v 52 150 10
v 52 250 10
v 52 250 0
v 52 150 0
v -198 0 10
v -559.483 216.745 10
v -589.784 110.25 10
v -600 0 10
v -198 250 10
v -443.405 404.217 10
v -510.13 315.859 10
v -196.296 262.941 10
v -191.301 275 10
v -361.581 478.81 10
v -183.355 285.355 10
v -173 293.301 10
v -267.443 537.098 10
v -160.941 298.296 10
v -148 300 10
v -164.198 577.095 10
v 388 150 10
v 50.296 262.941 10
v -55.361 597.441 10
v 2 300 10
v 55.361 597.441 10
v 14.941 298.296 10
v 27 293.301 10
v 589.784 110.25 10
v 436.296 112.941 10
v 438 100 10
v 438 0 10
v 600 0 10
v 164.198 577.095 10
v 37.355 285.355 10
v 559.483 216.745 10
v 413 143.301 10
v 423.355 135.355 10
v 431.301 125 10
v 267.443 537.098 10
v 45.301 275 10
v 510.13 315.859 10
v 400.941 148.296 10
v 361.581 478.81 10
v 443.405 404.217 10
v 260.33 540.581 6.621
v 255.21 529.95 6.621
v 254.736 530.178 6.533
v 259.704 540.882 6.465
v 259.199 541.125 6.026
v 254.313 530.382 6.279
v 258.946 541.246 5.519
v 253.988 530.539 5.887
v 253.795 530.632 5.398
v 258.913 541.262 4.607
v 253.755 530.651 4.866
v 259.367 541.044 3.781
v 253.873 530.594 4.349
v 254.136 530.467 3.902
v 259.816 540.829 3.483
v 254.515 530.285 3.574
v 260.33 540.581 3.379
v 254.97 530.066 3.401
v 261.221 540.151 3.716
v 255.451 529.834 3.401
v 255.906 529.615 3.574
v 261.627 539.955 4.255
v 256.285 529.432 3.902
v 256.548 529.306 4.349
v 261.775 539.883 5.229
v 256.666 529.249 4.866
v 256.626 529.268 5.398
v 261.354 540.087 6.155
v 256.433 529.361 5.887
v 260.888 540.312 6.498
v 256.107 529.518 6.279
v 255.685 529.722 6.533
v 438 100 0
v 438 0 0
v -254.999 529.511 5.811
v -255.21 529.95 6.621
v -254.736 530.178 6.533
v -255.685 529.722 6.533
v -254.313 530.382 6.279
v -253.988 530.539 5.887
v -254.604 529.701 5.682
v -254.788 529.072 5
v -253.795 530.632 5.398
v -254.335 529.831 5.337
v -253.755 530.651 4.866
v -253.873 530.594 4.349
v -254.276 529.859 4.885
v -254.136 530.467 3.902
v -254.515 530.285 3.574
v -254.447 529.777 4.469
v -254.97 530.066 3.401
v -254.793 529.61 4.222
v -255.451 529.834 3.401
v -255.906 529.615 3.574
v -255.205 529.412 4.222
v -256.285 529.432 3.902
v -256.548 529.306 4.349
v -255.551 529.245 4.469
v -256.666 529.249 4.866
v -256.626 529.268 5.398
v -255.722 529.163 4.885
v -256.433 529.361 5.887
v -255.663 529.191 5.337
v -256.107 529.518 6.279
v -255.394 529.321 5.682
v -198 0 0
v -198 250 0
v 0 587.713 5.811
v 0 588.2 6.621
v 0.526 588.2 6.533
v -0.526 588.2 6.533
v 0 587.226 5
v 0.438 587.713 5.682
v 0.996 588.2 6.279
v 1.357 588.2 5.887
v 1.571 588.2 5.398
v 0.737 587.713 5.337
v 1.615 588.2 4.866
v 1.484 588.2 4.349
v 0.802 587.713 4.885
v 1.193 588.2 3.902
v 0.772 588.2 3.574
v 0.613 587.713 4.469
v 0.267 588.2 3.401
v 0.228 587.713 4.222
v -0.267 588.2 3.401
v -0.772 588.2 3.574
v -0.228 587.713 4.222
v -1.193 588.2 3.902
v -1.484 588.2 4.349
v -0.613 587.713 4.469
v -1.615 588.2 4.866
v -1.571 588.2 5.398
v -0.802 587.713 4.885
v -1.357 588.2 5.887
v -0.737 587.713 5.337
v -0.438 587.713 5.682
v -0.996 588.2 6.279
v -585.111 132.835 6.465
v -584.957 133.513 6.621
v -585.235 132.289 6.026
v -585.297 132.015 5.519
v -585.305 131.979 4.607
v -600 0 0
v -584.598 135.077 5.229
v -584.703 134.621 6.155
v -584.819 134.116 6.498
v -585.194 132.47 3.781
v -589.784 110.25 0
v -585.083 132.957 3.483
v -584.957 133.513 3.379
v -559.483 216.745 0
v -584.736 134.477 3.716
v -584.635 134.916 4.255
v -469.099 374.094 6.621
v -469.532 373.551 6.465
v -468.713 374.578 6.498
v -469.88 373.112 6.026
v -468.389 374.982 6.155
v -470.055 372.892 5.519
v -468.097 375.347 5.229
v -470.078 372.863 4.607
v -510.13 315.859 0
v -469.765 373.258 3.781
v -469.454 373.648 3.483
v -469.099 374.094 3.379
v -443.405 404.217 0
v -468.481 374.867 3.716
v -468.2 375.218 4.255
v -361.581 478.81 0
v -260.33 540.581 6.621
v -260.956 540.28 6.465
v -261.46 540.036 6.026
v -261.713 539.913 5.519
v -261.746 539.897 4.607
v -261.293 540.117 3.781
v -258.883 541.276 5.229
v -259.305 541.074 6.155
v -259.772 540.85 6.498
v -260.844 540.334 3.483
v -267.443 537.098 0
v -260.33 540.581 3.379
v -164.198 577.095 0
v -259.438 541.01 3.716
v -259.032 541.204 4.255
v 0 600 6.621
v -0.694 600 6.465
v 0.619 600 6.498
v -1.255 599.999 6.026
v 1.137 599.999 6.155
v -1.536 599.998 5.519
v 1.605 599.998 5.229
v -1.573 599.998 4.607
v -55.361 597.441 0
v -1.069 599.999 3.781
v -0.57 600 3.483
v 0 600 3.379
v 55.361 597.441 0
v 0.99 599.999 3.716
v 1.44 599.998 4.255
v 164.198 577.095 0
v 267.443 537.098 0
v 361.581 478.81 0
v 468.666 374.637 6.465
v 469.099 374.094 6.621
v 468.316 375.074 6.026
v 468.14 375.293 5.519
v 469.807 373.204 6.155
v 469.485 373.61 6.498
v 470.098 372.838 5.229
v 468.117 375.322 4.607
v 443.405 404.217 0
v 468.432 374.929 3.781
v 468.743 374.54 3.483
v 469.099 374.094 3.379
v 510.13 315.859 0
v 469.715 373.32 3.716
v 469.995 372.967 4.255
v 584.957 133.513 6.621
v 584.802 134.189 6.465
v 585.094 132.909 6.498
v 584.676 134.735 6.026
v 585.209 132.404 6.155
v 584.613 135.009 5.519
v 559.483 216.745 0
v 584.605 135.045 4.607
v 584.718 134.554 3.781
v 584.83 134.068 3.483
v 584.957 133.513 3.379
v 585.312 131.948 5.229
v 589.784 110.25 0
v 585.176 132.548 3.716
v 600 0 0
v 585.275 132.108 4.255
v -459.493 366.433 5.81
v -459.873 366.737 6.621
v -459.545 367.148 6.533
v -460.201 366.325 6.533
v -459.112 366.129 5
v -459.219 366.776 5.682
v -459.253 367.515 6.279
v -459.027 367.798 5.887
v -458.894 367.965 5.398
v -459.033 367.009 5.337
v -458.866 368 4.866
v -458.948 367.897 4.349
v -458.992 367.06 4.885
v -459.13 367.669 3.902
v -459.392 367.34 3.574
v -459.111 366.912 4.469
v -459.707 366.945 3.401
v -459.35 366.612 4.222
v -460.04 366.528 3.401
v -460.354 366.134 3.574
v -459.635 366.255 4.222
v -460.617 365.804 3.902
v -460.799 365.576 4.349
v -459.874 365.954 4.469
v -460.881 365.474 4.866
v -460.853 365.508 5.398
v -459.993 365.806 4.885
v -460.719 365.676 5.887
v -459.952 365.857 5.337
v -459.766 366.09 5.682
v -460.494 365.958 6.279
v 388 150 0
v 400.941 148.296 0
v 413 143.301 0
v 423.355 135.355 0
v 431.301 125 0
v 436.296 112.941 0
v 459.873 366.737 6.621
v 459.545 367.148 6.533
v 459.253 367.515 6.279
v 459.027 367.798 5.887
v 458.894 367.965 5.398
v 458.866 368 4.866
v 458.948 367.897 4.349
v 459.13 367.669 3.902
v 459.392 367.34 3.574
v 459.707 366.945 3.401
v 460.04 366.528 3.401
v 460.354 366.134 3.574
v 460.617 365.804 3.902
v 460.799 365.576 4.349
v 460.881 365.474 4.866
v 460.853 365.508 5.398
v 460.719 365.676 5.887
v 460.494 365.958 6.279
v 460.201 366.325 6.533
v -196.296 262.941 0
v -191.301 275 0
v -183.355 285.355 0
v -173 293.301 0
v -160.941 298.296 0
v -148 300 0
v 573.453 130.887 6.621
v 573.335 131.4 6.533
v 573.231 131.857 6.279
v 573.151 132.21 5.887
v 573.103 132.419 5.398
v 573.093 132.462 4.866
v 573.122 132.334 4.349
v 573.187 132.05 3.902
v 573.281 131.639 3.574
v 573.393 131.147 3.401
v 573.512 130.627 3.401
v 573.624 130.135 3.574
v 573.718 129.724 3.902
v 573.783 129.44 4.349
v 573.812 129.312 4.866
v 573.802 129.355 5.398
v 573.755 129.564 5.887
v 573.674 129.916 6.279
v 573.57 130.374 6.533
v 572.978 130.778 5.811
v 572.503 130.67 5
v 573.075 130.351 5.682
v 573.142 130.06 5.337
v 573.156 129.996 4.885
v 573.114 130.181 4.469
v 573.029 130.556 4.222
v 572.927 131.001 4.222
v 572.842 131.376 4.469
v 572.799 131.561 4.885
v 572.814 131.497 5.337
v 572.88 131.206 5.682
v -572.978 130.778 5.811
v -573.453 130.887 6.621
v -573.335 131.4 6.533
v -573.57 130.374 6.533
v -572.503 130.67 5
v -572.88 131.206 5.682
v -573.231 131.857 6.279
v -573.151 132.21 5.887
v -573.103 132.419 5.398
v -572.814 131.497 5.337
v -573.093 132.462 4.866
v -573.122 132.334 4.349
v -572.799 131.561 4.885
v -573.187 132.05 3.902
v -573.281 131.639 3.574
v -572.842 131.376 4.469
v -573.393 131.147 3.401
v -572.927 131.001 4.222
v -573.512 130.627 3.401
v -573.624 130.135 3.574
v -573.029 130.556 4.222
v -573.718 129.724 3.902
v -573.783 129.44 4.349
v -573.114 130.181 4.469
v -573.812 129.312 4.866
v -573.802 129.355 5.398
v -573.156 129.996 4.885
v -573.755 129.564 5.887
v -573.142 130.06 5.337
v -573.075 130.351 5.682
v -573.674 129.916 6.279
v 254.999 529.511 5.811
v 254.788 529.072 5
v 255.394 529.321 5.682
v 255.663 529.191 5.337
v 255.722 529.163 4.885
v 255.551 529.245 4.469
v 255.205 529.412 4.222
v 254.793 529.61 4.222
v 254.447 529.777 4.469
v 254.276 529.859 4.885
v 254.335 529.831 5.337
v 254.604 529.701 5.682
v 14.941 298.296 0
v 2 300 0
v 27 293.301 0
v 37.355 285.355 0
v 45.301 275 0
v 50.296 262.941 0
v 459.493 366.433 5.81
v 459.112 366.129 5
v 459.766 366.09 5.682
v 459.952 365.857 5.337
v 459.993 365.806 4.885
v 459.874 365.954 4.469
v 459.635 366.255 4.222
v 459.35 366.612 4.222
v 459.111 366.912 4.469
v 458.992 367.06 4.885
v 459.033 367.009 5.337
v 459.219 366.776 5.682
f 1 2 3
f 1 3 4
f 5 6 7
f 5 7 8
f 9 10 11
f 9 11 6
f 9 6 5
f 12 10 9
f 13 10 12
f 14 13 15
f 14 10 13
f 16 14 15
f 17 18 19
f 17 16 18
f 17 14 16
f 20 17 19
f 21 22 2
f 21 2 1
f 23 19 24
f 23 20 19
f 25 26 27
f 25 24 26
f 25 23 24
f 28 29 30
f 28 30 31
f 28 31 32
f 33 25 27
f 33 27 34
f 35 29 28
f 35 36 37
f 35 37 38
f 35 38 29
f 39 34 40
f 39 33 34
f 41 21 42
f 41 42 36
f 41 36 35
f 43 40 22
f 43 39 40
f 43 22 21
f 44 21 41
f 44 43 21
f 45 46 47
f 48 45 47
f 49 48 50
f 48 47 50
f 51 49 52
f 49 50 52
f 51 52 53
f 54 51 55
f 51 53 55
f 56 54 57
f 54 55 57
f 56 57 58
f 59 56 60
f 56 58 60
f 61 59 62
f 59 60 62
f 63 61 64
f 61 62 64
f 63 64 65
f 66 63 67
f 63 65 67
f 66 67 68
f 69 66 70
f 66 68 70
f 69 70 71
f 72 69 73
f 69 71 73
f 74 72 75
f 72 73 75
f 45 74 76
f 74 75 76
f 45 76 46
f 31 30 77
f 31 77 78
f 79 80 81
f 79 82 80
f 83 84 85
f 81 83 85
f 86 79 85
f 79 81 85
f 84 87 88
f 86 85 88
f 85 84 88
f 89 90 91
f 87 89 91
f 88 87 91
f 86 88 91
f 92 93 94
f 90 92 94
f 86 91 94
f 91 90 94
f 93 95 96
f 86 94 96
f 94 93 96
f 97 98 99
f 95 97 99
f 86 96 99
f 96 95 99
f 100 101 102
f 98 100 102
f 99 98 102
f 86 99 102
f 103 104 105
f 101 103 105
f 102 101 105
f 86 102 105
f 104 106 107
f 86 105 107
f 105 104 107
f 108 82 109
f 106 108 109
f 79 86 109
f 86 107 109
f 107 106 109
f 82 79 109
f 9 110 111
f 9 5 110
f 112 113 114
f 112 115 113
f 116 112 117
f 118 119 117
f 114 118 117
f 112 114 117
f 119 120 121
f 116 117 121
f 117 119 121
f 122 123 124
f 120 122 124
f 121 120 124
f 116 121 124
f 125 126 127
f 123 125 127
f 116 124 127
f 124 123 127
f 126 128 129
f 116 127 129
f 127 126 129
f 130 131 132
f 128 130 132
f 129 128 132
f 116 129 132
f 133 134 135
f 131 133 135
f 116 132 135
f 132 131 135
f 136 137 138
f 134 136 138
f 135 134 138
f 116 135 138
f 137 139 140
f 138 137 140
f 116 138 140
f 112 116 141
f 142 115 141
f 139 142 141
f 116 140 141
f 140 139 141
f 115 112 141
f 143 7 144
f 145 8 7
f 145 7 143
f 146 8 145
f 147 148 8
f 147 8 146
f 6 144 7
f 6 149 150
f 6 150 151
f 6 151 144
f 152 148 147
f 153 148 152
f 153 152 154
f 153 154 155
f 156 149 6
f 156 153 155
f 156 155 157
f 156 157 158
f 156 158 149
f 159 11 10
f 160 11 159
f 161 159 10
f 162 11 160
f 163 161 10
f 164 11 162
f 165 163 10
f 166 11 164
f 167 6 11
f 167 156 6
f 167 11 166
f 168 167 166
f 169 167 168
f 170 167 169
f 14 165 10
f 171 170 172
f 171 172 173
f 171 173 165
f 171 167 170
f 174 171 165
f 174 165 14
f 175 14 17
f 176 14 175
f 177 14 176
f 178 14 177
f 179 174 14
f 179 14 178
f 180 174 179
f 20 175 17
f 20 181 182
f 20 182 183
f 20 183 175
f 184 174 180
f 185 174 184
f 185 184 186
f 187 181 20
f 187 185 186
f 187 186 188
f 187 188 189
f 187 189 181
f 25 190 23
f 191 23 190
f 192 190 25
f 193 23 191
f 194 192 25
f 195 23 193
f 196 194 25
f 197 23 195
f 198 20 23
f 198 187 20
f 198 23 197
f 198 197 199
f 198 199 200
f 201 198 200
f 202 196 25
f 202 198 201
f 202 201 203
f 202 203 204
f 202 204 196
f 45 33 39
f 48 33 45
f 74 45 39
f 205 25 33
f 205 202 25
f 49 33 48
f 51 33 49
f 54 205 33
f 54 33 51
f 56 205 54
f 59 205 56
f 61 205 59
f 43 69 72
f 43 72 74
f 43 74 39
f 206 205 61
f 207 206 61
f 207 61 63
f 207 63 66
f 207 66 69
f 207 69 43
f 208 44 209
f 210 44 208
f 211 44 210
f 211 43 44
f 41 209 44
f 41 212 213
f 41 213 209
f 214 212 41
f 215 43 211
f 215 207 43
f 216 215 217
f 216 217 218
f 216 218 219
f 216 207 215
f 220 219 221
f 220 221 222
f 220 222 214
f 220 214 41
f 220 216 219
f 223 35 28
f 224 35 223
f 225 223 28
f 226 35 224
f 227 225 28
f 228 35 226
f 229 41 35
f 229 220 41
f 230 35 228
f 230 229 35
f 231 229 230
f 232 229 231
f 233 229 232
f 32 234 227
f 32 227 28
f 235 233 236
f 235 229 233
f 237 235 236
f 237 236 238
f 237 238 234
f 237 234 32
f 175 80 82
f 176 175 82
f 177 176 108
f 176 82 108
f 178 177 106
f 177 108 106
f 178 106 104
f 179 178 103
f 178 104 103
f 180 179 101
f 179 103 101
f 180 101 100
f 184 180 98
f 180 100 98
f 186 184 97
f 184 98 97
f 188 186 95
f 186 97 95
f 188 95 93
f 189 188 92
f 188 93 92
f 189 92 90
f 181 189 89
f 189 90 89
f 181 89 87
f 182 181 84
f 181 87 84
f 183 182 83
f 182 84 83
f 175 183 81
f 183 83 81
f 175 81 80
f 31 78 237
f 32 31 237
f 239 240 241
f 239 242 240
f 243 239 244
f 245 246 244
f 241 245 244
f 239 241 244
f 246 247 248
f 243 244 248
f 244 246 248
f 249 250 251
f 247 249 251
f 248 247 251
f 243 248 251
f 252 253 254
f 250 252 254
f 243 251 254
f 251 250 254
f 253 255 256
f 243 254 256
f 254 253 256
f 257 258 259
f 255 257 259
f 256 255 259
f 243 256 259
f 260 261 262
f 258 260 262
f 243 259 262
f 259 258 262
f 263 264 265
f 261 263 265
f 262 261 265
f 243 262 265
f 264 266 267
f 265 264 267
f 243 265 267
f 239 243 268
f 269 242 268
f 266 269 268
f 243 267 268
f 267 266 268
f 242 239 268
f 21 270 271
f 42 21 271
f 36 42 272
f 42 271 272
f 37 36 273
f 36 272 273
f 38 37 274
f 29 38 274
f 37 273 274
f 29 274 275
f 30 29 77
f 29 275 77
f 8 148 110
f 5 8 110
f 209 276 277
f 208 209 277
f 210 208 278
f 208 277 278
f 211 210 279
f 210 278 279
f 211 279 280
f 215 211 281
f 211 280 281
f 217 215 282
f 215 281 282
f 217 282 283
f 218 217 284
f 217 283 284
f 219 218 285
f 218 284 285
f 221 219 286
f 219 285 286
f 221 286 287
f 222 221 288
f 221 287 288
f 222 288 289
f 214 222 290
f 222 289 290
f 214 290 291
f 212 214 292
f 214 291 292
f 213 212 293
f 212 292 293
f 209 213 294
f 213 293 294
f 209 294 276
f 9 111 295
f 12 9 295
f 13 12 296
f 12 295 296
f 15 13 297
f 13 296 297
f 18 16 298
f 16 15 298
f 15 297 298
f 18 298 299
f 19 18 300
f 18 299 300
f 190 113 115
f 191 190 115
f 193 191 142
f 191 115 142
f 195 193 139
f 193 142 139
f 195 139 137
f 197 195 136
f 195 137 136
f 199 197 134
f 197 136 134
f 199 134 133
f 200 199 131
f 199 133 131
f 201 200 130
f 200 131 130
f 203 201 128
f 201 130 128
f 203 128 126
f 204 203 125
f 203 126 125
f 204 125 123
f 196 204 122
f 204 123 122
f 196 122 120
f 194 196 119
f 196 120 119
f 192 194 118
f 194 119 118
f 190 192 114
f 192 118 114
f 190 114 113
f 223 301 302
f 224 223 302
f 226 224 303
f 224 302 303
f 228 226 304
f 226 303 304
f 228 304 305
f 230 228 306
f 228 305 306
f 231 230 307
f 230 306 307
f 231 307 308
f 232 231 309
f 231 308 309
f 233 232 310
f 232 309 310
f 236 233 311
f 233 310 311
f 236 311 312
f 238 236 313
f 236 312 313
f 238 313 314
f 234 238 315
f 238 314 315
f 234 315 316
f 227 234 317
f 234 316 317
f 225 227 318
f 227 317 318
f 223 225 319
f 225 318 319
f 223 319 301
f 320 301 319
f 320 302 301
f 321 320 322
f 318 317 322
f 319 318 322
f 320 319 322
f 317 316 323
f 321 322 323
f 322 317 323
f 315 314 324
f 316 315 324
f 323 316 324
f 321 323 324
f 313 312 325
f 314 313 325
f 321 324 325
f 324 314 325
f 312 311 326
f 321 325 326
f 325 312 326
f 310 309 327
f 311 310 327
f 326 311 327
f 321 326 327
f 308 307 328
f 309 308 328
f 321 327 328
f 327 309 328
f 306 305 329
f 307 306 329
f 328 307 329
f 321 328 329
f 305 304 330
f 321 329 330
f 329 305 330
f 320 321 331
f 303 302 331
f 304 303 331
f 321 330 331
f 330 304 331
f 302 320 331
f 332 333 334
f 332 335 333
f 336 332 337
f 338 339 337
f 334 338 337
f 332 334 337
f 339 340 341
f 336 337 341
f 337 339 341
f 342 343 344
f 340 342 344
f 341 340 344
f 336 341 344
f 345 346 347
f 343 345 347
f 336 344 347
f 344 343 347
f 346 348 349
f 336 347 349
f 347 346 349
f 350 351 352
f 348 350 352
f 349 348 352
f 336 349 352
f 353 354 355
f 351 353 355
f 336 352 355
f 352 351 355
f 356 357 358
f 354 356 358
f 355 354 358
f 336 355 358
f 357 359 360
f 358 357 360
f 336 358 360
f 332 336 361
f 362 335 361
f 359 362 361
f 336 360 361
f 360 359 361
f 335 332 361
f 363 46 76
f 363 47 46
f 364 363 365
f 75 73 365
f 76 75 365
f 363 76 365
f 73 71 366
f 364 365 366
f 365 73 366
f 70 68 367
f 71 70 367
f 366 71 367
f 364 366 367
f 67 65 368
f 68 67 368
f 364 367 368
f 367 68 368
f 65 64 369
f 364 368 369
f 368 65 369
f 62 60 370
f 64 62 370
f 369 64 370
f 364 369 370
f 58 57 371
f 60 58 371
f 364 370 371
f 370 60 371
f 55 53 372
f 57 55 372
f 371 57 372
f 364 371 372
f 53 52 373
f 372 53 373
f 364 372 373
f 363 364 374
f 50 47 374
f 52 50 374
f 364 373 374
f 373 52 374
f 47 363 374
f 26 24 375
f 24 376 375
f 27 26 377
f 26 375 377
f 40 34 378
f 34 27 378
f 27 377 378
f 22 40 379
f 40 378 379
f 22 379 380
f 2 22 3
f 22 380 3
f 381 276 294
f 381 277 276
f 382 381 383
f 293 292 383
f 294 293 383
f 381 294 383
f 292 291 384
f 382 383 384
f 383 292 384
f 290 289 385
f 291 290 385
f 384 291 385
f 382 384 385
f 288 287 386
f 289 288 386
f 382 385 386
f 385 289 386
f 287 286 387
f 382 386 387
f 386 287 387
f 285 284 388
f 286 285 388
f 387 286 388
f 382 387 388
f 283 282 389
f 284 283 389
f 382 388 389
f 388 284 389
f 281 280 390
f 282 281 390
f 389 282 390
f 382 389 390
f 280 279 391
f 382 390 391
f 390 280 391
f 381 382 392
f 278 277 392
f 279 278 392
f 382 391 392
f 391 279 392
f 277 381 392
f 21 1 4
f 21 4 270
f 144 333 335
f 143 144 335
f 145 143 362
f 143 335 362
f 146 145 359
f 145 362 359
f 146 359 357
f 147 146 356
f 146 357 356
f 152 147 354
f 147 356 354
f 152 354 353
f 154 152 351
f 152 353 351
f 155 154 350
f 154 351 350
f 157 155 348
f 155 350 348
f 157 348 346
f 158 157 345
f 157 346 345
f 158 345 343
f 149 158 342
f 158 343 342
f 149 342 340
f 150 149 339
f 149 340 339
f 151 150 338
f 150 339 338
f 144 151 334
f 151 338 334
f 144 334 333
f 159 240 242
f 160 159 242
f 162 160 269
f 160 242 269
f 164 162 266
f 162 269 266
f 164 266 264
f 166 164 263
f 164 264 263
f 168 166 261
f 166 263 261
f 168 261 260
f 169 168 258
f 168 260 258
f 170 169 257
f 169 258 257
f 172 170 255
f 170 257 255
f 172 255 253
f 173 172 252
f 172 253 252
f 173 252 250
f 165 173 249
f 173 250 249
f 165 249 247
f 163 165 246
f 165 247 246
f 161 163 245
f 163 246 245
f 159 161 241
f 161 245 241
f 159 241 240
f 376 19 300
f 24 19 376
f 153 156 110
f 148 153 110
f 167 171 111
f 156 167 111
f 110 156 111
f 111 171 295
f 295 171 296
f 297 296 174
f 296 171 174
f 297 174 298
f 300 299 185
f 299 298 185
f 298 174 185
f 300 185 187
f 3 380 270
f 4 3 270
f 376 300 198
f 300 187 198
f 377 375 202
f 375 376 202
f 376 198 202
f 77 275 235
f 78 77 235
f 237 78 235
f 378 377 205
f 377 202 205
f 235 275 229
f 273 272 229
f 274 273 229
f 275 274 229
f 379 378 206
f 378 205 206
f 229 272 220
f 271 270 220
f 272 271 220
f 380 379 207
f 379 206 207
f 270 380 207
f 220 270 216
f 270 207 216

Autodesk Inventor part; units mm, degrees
ref_plane "YZ Plane" through (0, 0, 0) normal (1, 0, 0) x (0, 1, 0)
ref_plane "XZ Plane" through (0, 0, 0) normal (0, 1, 0) x (-1, 0, 0)
sketch "Sketch1" plane through (0, 0, 0) normal (0, 0, 1) x (1, 0, 0)
  arc A0 (600, 0) -> (-600, 0) centre (0, 0) ccw
  line L0 (-600, 0) -> (600, 0)
  point P0 (0, 0)
  dimension "d0" = 1200
extrude "Extrusion1" add sketch "Sketch1" along normal blind 10
sketch "Sketch2" plane through (0, 0, 10) normal (0, 0, 1) x (1, 0, 0)
  line L0 (-600, 0) -> (600, 0) projected
  line L1 (438, 0) -> (-198, 0)
  line L2 (-198, 0) -> (-198, 300)
  line L3 (-198, 300) -> (438, 300)
  line L4 (438, 300) -> (438, 0)
  point P0 (0, 0)
  dimension "d3" = 300
  dimension "d4" = 636
  dimension "d5" = 198
extrude "Extrusion2" cut sketch "Sketch2" against normal through all
sketch "Sketch3" plane through (0, 0, 10) normal (0, 0, 1) x (1, 0, 0)
  line L0 (-198, 300) -> (438, 300) projected
  line L1 (438, 300) -> (52, 300)
  line L2 (52, 300) -> (52, 150)
  line L3 (52, 150) -> (438, 150)
  line L4 (438, 150) -> (438, 300)
  line L5 (-198, 0) -> (-198, 300) projected
  point P0 (0, 0)
  dimension "d9" = 150
  dimension "d10" = 250
extrude "Extrusion3" add sketch "Sketch3" against normal up to surface (10 mm away)
fillet "Fillet2" radius 50 3 edges at (-198, 300, 5) (52, 300, 5) (438, 150, 5)
ref_plane "Work Plane1" through (-600, 600, 0) normal (0, -1, 0) x (1, 0, 0)
sketch "Sketch4" plane through (-600, 600, 0) normal (0, -1, 0) x (1, 0, 0)
  line L0 (1200, 10) -> (0, 10) projected
  line L1 (600, 12) -> (600, -2) projected
  point P0 (600, 0)
  point P1 (600, 5)
  dimension "d15" = 5
hole "Hole1" at (0, 600, 5) direction (0, -1, 0) diameter 3.242 depth 11.8 tip angle 118 thread size "M4x0.7" class "6H" standard "ANSI Metric M Profile"
pattern_circular "Circular Pattern1" count 14 over 360 about axis through (0, 0, -10) along (0, 0, 1) of "Hole1"
properties part number "Top_Guard 2" material "PMMA Plastic"
